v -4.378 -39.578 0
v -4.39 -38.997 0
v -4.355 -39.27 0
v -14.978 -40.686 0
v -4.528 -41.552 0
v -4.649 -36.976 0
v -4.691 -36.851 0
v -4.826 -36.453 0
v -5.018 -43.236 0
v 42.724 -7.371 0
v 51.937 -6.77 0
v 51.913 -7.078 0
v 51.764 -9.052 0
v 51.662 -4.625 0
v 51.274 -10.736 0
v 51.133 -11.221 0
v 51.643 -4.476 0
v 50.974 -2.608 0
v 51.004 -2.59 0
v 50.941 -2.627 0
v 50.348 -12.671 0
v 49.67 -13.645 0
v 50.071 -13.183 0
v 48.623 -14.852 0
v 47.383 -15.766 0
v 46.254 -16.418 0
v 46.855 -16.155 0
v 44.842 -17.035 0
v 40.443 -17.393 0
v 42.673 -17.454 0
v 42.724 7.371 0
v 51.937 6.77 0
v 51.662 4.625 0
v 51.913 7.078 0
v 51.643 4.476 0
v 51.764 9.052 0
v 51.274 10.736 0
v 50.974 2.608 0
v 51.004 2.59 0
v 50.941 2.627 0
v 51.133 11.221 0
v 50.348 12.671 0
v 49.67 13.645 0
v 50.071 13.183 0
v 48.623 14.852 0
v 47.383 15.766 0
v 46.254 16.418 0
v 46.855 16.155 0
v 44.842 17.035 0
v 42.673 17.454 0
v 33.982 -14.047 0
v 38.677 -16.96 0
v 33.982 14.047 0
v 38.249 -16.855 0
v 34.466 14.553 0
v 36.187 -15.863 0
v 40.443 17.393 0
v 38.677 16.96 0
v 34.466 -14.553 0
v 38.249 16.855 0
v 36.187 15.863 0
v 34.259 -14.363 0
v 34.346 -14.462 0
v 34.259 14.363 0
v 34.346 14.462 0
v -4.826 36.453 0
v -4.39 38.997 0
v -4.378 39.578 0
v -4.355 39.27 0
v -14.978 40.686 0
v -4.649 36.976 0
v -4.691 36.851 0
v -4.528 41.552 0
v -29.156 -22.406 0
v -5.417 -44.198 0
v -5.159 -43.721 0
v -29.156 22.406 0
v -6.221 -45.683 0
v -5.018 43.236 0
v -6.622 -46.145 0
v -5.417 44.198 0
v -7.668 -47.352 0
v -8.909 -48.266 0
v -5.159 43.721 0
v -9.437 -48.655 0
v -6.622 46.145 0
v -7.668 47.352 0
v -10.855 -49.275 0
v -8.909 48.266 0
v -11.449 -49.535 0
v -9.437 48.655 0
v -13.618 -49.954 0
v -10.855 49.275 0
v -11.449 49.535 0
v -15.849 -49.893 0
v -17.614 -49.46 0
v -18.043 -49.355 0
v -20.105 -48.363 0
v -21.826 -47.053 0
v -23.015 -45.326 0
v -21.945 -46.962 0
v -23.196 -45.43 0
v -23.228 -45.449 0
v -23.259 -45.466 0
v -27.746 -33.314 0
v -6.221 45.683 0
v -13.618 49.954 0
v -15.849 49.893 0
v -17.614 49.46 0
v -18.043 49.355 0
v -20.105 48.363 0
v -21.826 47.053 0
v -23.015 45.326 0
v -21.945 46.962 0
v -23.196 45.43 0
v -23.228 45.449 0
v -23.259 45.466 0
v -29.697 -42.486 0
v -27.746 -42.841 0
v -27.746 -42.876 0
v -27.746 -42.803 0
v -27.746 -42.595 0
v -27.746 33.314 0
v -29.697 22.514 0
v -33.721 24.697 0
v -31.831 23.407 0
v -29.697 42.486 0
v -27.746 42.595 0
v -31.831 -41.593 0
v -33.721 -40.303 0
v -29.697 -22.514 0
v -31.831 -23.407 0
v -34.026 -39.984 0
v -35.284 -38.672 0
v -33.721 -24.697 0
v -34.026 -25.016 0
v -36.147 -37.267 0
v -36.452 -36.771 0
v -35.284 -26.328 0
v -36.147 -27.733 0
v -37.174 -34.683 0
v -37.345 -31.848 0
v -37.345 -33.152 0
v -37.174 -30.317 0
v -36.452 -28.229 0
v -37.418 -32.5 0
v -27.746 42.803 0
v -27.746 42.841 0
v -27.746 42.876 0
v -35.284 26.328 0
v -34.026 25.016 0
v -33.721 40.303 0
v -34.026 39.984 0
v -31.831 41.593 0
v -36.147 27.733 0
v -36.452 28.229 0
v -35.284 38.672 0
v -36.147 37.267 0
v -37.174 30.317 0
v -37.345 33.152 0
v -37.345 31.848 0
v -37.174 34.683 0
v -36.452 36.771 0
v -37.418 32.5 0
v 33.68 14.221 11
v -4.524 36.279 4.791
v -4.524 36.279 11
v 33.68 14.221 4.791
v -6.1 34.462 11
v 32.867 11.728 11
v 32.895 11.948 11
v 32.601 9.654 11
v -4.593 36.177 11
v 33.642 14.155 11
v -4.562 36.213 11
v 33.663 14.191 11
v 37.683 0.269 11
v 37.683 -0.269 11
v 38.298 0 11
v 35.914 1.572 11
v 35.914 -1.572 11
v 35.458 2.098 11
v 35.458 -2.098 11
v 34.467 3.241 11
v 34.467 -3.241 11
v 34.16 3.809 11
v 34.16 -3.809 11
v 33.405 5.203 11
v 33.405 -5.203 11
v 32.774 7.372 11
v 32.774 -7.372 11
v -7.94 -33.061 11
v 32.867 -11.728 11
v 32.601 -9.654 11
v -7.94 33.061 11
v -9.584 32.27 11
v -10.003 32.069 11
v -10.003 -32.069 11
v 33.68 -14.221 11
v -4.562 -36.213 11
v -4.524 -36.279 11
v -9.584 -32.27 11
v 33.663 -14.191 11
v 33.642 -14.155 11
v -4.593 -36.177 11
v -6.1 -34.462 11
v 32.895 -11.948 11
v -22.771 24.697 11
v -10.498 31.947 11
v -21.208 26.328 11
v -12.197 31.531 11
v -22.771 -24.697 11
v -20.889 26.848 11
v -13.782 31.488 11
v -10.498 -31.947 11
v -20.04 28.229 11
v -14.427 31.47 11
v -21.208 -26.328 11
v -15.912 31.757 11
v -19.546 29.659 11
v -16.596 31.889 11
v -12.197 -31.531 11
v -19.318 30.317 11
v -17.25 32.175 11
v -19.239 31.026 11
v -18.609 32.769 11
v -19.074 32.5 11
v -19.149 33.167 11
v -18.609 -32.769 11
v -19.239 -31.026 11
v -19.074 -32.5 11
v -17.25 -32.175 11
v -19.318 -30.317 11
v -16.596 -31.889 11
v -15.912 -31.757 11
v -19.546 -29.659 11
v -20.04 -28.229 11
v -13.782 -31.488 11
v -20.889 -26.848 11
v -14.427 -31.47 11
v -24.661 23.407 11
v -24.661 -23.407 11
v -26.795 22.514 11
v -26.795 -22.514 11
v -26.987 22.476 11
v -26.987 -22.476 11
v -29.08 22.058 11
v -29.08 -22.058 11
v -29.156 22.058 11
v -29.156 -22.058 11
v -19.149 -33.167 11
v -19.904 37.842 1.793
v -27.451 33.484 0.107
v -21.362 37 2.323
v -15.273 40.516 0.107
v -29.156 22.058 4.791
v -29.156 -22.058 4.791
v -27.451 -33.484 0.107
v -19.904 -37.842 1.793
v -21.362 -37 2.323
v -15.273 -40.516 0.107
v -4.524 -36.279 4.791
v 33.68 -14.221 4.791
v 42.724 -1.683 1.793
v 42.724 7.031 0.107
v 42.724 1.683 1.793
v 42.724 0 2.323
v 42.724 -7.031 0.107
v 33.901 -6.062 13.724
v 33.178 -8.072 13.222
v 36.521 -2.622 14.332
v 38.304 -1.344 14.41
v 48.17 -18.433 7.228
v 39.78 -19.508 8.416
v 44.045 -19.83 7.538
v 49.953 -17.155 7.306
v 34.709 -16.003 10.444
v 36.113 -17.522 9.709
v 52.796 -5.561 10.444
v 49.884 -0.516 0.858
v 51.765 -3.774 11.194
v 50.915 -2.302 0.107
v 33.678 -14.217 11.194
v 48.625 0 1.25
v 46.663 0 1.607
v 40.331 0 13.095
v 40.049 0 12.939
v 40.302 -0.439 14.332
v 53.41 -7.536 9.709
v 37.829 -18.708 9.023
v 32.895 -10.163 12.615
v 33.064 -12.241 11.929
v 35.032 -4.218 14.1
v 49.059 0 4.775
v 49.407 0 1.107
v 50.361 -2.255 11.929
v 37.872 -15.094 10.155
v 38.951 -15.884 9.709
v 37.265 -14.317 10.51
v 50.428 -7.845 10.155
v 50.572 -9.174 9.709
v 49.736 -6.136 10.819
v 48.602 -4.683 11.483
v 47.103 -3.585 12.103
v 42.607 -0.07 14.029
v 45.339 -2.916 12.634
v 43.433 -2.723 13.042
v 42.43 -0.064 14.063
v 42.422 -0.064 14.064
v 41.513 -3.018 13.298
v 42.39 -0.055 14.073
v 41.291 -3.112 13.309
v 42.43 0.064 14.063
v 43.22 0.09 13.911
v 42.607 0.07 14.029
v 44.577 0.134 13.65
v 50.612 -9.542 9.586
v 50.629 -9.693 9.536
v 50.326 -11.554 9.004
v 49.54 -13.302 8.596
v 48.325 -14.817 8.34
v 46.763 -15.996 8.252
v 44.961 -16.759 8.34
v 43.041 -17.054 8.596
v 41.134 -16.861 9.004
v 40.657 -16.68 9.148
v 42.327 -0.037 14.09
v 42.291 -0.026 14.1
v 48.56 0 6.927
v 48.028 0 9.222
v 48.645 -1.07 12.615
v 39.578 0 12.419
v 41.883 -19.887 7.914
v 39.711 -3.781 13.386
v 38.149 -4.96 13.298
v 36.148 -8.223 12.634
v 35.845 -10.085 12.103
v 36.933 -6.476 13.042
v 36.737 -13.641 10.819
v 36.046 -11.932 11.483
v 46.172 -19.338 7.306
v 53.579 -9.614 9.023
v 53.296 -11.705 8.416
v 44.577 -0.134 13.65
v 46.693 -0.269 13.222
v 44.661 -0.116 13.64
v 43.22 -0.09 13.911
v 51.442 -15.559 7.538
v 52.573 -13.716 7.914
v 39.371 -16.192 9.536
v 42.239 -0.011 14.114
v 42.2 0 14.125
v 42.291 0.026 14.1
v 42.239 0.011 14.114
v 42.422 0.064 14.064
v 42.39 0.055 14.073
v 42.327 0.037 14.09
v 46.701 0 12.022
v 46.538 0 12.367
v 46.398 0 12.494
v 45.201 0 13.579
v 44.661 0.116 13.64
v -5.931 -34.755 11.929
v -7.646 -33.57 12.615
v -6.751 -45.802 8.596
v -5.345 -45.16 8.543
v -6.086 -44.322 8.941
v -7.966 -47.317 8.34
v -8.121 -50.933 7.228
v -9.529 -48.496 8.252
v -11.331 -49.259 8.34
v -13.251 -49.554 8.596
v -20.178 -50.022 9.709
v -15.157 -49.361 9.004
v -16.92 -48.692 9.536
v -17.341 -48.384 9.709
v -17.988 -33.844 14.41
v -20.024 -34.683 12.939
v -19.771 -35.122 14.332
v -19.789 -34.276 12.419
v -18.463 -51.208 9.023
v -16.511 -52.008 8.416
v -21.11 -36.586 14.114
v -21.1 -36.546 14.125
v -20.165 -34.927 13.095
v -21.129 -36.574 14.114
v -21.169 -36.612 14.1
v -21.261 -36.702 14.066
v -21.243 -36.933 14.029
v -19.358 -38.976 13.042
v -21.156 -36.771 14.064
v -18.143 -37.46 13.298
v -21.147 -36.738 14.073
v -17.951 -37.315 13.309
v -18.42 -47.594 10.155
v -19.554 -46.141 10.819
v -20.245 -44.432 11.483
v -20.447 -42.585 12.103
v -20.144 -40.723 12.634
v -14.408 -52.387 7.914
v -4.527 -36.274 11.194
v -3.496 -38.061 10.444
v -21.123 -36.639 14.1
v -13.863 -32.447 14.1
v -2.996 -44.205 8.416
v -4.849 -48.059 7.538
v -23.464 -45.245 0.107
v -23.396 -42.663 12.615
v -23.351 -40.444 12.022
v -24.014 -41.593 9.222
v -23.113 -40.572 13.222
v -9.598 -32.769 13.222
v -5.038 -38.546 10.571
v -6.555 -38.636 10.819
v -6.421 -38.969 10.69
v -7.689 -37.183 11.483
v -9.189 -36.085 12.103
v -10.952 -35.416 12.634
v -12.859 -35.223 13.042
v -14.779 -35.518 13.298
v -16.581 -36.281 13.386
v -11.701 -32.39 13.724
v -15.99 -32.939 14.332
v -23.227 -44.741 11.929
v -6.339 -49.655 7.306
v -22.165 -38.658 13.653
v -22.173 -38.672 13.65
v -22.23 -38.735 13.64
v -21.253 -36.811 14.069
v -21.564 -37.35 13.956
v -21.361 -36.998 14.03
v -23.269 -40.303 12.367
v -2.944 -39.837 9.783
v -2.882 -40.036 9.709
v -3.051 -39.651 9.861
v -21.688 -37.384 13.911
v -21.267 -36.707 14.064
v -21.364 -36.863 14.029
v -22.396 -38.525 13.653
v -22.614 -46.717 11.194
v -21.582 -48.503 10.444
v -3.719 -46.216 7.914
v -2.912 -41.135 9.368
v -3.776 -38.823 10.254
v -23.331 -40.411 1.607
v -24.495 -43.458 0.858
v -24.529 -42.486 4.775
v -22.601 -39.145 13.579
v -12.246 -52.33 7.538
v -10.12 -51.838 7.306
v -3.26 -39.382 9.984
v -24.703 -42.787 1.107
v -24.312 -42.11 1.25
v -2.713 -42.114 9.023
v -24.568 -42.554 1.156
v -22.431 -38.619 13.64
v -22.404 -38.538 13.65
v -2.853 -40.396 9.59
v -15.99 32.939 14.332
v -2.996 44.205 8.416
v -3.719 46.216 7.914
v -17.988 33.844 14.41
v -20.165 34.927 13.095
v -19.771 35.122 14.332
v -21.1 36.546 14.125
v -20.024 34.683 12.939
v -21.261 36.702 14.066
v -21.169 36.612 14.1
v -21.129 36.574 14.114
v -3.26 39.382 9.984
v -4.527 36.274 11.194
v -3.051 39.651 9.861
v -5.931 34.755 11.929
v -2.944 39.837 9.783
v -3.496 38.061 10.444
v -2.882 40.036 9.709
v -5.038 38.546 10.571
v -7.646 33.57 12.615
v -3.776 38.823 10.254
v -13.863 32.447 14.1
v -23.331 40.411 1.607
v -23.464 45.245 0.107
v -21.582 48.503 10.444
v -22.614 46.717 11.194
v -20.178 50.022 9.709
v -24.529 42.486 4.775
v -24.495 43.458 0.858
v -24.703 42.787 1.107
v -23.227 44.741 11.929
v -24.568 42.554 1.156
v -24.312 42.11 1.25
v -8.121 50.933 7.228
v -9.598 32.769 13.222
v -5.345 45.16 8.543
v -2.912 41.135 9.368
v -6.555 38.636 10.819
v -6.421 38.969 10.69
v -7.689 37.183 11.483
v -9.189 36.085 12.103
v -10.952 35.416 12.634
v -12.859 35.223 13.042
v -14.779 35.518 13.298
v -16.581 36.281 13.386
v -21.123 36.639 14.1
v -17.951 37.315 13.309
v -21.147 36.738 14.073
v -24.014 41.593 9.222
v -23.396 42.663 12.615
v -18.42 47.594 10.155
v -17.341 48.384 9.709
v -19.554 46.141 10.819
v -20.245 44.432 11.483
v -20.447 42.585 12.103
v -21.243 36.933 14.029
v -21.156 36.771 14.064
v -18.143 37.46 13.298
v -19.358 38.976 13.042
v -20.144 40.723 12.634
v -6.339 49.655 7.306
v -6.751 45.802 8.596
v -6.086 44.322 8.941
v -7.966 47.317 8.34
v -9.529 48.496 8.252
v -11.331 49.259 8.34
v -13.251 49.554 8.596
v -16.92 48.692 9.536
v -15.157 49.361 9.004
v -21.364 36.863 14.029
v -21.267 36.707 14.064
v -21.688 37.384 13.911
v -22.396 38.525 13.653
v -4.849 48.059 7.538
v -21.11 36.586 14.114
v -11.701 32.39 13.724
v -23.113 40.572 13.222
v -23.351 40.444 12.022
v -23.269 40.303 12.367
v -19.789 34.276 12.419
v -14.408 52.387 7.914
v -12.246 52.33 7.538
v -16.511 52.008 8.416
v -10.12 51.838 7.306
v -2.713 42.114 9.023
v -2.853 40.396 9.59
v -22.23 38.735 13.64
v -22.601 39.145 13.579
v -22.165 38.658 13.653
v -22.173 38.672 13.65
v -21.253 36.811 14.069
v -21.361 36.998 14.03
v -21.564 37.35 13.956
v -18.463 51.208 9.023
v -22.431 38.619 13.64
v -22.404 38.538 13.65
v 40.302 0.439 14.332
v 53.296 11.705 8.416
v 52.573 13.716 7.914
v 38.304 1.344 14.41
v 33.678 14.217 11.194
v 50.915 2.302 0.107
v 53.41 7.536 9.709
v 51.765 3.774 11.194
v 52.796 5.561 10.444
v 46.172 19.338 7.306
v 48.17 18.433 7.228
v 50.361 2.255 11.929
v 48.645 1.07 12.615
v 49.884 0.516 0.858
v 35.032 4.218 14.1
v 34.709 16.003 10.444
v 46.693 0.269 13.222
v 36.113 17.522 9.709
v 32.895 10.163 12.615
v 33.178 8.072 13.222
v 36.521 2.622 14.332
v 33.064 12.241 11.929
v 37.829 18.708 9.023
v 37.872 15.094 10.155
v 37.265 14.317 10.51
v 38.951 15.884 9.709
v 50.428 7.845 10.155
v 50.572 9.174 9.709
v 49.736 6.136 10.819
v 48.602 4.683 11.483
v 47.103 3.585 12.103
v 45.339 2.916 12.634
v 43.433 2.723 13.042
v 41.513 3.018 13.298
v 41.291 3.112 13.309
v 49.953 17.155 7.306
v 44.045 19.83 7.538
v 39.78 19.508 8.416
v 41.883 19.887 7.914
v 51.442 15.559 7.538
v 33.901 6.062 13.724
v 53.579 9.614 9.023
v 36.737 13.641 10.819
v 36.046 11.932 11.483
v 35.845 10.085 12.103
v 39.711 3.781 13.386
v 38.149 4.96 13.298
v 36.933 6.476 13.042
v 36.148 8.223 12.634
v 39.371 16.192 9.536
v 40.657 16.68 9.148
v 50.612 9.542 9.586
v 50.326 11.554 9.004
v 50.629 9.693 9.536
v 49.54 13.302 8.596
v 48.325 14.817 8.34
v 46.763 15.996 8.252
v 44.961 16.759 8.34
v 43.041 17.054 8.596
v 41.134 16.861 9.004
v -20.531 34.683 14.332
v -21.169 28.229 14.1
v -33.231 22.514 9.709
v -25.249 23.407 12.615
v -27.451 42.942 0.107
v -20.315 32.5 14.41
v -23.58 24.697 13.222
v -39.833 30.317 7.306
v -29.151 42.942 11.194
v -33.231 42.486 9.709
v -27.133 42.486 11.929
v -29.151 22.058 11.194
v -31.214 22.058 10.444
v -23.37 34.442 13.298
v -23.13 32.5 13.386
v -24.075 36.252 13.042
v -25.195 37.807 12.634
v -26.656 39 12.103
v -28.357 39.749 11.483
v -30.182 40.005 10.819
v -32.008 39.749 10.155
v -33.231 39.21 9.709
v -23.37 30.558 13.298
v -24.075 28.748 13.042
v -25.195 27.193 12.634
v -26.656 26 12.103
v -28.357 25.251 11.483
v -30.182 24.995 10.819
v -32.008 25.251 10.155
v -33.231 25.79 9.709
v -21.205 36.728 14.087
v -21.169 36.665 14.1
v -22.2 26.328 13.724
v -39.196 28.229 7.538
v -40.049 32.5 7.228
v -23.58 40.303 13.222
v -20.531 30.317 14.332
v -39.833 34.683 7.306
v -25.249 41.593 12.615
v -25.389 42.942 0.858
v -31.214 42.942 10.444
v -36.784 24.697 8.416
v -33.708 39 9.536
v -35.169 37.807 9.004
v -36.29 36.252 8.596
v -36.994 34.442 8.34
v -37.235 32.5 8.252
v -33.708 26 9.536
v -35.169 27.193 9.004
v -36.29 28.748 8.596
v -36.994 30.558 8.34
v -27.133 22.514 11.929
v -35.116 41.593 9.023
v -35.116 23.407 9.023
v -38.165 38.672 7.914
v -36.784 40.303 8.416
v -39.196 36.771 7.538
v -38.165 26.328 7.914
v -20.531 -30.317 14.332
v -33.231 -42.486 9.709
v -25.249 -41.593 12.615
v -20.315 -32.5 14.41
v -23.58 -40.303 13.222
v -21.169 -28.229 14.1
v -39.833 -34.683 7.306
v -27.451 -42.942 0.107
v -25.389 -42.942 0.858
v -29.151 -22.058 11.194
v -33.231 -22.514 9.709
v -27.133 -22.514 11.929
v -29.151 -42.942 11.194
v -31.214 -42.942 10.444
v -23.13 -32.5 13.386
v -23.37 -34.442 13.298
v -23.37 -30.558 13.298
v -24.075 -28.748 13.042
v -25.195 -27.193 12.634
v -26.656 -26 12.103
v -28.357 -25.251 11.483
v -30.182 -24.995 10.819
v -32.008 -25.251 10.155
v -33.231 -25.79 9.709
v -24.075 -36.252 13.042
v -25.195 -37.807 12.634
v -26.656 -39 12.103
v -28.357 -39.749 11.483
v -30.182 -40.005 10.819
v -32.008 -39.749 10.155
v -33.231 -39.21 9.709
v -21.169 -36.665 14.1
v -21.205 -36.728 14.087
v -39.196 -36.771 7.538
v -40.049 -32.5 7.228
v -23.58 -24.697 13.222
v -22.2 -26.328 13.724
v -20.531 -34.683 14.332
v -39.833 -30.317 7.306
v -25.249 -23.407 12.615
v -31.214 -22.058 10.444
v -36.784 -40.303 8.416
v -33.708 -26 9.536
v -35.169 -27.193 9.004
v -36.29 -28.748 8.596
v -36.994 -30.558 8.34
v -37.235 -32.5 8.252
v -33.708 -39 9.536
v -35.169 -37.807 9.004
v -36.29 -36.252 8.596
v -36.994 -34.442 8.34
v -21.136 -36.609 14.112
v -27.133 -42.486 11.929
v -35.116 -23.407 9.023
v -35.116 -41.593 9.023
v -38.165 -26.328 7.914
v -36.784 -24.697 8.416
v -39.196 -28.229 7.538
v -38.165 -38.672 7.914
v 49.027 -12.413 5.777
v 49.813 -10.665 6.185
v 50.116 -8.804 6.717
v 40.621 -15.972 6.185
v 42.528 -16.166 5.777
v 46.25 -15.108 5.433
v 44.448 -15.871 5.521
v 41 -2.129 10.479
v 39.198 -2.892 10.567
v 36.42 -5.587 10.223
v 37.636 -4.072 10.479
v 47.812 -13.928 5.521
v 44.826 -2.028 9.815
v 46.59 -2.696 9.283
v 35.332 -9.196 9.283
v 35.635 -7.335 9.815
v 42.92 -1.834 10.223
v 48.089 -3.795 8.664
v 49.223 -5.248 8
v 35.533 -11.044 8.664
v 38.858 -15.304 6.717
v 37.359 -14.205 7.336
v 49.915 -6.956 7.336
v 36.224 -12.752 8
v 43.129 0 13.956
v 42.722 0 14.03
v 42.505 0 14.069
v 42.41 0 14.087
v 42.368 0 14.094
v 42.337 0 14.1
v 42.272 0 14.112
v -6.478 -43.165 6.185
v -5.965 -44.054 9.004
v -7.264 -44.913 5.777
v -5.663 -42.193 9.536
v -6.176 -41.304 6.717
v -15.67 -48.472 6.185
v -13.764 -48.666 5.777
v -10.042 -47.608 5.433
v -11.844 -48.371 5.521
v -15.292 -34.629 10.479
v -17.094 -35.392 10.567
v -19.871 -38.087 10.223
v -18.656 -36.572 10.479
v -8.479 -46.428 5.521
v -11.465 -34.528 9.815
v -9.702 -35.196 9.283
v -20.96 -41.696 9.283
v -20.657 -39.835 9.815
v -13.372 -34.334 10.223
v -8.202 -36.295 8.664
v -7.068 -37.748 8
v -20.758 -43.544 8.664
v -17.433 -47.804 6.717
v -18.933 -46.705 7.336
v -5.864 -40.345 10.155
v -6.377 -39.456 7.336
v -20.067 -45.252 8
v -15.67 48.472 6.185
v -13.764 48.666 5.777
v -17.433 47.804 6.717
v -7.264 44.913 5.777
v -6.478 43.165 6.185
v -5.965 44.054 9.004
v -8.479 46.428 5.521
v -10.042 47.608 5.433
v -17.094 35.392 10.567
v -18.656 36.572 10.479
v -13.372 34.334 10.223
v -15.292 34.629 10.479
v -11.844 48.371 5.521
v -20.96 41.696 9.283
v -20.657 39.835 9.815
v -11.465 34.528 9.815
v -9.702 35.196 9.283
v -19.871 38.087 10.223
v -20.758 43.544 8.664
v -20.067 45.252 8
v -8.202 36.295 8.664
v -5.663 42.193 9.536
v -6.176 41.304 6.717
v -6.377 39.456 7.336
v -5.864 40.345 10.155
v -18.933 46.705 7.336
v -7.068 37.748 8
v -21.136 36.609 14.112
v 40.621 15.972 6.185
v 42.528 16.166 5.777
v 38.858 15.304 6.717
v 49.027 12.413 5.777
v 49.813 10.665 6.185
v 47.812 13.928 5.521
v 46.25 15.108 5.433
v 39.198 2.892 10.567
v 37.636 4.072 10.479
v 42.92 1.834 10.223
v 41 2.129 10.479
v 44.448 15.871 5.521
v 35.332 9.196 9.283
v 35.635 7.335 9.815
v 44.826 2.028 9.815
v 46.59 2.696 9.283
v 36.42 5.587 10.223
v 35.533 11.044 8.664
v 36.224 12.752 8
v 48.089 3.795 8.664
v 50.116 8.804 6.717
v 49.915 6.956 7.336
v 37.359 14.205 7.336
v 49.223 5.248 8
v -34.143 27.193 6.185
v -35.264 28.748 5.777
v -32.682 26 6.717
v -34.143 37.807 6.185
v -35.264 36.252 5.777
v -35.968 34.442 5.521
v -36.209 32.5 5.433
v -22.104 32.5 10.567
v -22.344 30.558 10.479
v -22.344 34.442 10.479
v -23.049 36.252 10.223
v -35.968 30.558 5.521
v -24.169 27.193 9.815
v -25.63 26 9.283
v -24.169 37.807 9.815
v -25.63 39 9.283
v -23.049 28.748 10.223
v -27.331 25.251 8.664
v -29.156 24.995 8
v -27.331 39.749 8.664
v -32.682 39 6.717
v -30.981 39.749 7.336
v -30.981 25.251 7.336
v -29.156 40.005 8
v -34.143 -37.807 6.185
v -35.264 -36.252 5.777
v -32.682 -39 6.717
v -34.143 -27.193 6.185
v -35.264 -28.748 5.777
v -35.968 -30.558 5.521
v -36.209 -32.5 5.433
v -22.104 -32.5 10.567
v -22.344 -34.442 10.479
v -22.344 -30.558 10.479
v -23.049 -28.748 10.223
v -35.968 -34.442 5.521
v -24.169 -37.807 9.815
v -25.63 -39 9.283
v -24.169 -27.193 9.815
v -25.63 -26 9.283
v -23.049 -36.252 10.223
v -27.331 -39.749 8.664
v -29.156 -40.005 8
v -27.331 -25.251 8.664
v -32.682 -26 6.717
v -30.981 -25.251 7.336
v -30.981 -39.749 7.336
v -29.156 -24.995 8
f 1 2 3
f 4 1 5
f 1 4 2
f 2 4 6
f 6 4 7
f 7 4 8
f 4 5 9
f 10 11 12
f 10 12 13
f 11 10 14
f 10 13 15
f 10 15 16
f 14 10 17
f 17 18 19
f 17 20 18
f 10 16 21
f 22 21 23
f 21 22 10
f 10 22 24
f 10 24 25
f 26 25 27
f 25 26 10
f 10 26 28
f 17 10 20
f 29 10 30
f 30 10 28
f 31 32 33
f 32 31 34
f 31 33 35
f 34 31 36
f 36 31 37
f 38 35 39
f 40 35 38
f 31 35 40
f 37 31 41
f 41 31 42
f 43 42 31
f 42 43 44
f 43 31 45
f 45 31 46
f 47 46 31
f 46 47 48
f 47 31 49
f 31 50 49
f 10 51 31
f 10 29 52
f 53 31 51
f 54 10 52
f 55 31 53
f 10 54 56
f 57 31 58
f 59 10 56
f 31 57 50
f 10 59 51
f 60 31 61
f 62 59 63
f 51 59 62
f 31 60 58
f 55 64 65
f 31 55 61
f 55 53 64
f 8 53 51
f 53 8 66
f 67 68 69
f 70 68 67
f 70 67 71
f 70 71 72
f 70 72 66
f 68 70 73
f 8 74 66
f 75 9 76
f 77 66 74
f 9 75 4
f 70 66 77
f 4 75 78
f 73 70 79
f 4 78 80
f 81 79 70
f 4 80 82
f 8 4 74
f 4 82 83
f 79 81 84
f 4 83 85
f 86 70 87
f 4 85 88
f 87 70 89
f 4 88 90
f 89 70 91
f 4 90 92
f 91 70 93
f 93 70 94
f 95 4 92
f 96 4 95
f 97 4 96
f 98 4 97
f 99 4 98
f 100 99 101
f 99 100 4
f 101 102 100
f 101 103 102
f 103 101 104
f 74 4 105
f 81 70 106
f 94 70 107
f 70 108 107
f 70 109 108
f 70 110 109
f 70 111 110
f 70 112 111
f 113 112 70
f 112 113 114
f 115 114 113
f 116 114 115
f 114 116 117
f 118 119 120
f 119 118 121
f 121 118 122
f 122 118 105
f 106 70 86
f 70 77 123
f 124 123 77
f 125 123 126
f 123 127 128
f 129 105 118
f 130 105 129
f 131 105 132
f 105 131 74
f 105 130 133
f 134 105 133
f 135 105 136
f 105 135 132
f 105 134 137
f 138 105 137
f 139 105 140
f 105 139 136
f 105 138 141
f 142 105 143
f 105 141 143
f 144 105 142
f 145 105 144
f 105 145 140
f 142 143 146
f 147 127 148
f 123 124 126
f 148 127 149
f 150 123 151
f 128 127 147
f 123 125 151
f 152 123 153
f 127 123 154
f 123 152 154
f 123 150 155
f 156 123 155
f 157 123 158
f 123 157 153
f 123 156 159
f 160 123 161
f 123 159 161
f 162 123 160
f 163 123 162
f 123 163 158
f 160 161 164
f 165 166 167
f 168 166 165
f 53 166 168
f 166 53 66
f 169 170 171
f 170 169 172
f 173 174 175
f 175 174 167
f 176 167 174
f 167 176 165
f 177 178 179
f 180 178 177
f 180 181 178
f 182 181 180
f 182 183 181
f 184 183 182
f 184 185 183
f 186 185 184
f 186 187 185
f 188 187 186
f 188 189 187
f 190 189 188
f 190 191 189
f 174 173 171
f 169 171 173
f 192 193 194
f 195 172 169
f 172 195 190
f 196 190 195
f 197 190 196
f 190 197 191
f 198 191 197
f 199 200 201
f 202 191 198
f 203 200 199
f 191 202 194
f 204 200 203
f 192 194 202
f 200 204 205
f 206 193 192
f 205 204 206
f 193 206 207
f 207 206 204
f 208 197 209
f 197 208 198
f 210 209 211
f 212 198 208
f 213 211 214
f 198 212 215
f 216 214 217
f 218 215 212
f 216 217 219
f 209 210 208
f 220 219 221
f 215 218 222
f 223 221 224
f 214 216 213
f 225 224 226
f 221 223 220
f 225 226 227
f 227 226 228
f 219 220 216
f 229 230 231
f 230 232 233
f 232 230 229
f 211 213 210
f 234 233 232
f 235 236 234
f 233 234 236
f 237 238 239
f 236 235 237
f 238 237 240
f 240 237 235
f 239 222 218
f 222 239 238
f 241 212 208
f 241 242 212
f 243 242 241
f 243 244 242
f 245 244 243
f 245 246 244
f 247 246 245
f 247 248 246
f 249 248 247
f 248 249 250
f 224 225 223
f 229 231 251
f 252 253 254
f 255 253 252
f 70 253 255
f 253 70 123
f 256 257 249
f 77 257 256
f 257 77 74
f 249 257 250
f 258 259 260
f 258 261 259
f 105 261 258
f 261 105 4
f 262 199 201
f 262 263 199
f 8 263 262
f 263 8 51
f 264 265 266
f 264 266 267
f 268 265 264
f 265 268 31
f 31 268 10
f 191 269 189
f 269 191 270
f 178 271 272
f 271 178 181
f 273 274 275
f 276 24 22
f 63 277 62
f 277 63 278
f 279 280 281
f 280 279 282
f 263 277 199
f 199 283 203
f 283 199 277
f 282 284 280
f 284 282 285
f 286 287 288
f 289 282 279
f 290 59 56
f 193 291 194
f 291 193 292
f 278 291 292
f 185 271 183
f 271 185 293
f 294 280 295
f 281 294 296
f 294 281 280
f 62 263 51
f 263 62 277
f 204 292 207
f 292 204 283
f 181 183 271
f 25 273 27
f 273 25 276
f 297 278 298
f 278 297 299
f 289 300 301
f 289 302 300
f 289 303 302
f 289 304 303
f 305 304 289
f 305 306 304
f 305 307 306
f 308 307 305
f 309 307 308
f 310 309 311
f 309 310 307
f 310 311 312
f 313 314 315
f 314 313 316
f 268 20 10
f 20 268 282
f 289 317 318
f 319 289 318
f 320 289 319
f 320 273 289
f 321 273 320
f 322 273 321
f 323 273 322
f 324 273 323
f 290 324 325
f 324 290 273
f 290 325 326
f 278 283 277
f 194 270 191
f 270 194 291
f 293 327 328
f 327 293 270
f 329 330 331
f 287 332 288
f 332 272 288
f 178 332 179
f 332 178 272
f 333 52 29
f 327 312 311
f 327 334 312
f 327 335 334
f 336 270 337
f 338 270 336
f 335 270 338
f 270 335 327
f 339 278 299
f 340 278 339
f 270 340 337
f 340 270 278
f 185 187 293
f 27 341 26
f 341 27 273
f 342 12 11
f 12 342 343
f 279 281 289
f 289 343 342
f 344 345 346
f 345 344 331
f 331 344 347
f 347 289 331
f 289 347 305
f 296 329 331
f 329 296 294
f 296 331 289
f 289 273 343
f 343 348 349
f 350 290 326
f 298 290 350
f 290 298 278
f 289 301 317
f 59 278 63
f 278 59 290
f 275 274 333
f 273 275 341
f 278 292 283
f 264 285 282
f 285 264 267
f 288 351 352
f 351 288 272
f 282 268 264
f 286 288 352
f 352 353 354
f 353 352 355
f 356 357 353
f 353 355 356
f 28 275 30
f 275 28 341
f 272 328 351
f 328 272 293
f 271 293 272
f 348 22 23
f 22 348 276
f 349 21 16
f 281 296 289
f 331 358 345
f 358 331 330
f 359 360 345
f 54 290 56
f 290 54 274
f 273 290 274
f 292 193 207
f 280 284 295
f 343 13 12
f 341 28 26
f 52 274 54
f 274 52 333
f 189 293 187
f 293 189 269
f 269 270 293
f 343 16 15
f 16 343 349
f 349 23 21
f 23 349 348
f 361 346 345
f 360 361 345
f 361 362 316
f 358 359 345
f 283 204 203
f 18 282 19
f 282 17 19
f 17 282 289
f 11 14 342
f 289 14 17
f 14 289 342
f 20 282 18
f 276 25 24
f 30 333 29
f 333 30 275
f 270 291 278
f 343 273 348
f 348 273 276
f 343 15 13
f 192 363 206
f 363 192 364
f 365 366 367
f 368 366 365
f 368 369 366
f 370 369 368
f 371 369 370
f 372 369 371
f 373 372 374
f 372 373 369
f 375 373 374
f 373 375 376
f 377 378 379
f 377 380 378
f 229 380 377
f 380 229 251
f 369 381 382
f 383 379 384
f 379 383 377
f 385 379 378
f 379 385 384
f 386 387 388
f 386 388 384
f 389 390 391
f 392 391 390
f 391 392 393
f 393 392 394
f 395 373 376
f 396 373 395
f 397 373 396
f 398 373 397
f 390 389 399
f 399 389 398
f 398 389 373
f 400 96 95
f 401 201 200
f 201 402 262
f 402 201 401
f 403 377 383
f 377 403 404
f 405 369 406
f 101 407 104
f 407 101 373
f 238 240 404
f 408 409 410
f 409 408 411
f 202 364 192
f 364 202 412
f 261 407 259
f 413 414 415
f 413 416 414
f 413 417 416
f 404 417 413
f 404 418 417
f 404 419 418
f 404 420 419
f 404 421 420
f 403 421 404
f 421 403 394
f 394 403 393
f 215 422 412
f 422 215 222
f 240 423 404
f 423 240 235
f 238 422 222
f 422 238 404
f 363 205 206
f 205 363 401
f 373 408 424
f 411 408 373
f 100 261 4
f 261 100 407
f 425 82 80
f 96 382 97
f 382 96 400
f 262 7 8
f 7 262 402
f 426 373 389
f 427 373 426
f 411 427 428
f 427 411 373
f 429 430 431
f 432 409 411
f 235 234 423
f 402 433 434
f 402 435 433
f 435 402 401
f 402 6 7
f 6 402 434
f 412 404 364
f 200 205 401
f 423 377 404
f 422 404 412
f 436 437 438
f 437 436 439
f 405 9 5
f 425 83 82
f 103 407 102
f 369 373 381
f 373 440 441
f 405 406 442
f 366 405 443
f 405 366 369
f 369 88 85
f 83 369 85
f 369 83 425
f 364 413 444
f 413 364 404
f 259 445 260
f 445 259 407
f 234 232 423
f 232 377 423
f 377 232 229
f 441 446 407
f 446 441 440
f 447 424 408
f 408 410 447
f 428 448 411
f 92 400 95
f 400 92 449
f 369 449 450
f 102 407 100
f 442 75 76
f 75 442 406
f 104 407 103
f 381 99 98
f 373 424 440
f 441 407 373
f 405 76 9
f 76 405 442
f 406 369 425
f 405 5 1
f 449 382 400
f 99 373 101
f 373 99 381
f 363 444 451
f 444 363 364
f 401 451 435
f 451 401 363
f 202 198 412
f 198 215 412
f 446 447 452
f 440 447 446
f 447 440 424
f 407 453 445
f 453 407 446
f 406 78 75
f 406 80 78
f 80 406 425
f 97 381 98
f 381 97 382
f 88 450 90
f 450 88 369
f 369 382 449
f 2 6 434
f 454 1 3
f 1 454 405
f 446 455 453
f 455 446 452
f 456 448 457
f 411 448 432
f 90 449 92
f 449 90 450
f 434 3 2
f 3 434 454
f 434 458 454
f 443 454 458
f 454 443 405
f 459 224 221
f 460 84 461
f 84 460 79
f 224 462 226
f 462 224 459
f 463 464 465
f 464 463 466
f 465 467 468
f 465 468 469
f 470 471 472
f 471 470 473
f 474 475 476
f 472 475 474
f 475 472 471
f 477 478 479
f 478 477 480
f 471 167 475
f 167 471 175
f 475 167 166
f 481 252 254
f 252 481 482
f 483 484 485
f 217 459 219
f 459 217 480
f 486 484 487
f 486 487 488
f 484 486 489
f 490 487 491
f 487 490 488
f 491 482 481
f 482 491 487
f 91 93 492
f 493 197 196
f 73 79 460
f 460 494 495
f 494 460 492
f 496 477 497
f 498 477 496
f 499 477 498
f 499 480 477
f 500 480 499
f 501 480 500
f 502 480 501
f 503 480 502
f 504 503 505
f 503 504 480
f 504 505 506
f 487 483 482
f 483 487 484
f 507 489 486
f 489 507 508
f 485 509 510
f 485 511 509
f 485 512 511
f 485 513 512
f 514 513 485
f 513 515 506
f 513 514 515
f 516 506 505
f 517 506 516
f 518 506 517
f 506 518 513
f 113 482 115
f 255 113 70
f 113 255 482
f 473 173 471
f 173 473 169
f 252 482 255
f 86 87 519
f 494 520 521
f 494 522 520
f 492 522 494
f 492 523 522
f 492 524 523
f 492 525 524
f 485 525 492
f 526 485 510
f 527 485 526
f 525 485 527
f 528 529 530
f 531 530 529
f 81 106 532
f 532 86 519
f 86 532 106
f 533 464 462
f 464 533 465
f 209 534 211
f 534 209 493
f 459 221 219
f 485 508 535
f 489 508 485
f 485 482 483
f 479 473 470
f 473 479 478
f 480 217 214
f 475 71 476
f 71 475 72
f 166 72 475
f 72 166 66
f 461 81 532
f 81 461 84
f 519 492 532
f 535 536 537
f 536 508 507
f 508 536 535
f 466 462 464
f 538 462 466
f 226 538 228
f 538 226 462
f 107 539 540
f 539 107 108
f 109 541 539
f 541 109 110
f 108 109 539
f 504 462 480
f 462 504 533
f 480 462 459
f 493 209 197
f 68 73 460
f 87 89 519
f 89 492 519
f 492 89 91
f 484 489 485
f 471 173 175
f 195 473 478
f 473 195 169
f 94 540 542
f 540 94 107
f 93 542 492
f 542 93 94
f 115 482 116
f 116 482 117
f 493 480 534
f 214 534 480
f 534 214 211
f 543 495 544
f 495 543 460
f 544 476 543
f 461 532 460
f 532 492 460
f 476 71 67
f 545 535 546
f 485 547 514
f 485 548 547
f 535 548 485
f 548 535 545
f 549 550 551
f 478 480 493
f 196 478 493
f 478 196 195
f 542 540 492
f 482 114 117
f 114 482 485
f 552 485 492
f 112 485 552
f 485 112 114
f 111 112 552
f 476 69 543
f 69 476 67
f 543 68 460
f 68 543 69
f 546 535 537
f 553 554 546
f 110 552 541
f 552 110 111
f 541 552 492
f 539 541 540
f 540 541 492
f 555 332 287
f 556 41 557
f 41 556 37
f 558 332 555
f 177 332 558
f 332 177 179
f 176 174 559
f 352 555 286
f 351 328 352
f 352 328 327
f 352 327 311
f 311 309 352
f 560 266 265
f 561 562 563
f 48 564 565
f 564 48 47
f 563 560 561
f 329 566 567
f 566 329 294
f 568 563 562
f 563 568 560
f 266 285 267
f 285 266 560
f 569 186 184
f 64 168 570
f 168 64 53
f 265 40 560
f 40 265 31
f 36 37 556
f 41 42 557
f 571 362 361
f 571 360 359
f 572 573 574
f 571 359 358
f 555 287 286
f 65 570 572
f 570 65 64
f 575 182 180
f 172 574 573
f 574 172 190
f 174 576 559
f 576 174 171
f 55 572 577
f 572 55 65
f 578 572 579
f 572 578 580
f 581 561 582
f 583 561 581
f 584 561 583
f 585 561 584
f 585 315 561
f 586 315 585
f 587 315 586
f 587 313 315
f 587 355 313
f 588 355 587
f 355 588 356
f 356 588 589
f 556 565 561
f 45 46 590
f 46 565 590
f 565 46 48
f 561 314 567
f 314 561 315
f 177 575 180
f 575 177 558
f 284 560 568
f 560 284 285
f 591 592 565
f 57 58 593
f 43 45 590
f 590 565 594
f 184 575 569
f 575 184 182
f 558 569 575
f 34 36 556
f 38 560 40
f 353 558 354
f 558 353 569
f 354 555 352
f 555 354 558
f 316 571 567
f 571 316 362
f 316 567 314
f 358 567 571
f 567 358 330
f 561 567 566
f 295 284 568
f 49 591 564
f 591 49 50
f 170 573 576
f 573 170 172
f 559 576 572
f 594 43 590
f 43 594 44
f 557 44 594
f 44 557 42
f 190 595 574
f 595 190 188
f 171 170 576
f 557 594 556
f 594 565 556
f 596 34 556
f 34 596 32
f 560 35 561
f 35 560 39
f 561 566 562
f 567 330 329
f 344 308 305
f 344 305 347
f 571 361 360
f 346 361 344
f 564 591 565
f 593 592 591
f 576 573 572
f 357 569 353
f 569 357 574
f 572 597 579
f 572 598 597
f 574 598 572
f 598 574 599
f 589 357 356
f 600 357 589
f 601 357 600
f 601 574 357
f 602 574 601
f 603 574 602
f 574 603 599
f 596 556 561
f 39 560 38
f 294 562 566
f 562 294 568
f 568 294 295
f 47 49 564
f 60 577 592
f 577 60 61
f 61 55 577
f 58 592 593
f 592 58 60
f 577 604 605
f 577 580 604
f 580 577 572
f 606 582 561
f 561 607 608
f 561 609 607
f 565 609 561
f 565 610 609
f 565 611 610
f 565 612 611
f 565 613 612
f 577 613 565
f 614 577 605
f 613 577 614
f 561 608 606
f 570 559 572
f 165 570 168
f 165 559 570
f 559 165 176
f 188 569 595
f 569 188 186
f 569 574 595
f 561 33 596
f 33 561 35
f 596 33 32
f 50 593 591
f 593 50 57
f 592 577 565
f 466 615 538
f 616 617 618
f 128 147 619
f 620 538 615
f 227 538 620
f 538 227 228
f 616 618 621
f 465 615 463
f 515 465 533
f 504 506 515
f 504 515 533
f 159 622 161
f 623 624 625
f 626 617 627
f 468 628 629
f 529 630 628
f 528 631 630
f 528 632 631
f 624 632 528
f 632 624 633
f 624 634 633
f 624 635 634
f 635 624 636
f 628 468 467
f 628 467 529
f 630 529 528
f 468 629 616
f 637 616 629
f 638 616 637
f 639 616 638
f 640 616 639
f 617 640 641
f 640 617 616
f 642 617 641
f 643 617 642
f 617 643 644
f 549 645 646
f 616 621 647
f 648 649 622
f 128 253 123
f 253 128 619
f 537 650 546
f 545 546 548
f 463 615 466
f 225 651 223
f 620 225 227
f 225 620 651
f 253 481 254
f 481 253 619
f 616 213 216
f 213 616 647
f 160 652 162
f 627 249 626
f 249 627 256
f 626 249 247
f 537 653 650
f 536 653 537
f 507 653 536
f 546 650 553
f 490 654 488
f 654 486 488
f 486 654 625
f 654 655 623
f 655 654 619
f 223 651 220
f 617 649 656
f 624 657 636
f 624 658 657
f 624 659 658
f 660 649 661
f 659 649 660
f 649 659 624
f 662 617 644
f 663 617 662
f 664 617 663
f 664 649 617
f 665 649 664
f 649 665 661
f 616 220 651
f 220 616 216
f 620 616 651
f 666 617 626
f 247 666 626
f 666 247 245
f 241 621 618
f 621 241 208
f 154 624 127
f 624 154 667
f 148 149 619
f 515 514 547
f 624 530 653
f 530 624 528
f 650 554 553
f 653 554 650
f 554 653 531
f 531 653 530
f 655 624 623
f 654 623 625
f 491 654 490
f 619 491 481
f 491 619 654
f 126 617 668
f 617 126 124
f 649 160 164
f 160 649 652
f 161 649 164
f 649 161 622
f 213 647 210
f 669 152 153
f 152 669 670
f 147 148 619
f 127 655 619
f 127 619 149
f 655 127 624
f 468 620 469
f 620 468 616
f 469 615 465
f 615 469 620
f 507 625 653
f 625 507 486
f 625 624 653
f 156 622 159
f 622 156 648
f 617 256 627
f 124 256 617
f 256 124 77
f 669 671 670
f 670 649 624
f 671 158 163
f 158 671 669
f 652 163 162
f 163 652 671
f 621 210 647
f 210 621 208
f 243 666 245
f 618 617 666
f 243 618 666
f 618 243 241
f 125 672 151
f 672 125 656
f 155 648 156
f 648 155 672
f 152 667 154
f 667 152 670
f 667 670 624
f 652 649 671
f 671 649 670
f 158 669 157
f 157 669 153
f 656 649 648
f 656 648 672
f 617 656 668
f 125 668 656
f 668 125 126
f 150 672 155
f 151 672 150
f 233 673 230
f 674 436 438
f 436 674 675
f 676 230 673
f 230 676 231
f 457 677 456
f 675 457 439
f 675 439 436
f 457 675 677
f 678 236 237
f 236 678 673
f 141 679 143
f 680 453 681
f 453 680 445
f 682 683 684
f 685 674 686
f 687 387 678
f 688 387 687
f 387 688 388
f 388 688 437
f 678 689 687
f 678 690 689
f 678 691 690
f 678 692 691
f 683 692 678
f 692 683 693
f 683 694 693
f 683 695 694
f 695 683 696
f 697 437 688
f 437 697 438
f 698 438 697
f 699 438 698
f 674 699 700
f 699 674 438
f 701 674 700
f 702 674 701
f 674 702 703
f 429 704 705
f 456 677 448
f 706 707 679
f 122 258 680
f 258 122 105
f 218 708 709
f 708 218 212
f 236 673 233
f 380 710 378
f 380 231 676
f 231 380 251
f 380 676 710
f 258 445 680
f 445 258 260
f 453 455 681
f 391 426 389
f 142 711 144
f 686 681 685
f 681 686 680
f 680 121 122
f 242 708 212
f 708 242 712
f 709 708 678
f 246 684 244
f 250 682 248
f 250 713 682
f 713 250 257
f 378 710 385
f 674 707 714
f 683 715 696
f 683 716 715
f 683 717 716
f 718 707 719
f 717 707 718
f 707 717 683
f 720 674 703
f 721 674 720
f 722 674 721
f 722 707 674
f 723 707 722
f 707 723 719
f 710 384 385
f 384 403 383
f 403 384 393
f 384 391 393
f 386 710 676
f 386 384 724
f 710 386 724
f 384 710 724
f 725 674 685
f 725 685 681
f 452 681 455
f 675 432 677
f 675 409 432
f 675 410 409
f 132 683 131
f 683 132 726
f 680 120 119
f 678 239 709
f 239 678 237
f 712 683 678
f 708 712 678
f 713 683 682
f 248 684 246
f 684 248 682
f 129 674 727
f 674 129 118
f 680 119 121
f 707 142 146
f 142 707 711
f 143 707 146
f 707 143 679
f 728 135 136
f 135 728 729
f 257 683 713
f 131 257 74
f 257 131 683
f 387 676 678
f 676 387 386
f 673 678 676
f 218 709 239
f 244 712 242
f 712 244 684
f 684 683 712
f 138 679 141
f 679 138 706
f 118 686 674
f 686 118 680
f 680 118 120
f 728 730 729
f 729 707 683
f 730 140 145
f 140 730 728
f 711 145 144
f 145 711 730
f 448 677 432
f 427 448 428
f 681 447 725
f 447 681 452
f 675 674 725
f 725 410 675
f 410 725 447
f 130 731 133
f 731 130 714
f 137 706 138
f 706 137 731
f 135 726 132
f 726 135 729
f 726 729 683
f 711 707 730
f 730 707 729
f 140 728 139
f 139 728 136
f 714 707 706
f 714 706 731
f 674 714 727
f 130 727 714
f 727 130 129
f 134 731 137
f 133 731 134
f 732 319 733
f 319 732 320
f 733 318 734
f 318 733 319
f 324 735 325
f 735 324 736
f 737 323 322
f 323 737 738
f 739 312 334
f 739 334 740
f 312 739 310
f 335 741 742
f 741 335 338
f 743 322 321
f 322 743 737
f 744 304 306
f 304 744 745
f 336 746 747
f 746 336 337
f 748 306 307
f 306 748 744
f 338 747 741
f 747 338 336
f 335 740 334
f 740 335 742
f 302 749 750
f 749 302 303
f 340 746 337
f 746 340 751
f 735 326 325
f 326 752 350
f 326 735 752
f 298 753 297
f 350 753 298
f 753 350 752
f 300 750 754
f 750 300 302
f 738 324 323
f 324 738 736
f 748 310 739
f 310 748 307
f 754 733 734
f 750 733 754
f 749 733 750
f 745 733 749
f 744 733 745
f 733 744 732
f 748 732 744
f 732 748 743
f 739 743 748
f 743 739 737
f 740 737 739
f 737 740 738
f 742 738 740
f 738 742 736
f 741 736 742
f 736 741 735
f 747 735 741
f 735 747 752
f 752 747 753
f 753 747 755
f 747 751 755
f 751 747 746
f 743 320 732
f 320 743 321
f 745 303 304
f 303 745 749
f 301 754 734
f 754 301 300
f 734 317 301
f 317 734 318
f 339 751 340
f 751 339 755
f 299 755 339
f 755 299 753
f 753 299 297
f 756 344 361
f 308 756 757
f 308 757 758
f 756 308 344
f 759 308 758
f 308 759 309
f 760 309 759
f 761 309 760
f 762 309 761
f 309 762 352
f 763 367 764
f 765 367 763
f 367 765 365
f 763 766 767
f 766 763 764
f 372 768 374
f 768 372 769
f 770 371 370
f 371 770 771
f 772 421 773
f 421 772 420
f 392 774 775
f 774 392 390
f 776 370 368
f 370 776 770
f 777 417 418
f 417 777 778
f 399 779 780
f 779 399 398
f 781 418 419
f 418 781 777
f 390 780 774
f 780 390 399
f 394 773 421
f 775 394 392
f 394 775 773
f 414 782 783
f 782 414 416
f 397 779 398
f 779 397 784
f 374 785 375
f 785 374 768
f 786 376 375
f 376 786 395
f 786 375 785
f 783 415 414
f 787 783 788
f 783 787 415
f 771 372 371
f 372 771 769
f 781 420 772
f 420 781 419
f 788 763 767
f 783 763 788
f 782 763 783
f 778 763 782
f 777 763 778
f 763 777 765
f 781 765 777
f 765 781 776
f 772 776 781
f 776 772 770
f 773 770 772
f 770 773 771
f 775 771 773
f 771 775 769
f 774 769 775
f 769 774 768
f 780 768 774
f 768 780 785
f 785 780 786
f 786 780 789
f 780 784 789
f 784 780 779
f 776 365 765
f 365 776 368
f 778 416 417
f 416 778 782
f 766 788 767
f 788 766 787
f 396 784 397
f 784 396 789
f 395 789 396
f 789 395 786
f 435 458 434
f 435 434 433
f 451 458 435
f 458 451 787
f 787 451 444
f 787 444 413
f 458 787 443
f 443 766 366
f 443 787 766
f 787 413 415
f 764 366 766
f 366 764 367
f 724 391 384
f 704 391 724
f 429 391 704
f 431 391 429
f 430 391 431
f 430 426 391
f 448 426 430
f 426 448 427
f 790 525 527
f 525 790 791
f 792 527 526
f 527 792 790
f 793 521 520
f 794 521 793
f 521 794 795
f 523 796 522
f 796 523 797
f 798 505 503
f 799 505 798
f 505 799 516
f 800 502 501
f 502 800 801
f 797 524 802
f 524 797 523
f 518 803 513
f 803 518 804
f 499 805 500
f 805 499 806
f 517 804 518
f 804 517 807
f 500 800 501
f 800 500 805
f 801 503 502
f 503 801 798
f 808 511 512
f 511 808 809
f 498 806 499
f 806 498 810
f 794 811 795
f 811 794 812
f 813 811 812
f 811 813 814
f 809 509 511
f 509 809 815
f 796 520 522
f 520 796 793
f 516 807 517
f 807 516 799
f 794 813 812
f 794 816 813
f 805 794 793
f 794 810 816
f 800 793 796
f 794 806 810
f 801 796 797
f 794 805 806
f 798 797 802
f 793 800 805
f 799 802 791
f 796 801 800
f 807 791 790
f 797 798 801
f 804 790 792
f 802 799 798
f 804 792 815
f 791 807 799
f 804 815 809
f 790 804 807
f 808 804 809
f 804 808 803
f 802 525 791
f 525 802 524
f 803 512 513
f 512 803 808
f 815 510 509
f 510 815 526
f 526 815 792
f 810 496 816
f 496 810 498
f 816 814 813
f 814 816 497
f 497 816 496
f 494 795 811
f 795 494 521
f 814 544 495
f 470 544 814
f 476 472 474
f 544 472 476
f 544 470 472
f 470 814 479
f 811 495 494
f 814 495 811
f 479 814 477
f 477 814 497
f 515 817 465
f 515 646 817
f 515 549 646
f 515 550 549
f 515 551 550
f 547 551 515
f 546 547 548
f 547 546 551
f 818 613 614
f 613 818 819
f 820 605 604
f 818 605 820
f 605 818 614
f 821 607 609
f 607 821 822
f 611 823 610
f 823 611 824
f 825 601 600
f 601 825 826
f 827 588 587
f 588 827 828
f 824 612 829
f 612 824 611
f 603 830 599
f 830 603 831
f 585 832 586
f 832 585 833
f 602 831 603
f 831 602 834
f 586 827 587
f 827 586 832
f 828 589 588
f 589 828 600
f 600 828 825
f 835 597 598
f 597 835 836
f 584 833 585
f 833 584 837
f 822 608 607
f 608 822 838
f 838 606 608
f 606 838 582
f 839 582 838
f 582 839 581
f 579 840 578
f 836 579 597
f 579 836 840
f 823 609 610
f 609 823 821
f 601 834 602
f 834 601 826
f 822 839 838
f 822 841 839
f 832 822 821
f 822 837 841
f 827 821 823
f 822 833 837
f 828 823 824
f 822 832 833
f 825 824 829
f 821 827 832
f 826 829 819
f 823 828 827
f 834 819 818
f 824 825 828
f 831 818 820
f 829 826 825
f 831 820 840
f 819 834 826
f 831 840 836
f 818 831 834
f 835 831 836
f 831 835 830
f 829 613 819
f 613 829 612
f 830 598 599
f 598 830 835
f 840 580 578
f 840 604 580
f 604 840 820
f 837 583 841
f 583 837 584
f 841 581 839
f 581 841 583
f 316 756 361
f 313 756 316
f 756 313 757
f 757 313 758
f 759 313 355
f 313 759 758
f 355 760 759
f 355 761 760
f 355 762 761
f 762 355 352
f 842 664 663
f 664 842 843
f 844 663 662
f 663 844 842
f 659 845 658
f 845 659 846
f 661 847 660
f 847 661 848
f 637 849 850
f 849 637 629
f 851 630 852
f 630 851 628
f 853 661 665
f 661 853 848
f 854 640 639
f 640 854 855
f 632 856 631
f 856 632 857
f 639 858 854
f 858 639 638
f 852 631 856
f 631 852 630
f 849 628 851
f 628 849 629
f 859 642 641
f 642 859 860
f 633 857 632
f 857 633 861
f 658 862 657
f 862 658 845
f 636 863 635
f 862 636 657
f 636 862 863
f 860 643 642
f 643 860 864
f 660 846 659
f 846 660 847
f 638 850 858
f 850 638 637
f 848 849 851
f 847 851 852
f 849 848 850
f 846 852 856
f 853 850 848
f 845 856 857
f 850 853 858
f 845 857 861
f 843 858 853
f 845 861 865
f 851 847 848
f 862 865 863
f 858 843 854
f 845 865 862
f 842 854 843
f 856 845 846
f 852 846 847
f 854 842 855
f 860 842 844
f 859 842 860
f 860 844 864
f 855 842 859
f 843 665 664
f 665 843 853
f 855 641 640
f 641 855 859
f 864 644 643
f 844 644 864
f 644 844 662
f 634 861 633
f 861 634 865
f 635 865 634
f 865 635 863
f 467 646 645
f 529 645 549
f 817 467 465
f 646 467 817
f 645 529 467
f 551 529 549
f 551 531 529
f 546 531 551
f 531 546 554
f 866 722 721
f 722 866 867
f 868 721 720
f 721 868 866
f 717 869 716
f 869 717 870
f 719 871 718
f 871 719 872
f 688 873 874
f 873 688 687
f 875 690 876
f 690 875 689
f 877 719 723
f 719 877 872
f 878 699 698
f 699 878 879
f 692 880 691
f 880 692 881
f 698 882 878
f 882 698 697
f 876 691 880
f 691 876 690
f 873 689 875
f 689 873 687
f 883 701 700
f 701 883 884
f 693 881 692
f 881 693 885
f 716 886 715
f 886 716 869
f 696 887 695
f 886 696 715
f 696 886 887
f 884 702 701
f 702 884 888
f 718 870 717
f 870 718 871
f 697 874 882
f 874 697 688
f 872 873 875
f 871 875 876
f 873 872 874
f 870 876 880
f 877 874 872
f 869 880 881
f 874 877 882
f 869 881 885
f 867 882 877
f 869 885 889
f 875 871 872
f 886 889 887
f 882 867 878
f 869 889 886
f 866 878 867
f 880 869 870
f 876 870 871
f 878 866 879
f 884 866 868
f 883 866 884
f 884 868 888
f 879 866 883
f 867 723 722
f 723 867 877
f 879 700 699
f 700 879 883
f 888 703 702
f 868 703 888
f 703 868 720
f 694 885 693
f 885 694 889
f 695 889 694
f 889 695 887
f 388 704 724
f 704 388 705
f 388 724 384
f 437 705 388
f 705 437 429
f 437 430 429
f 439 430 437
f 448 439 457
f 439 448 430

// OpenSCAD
// file: ../../conf/printer_config.scad
/**********************************************************************************************************************
 **
 ** conf/printer_config.scad
 **
 ** This file contains the main control variables that determine the size and shape of the printer. Note that in the
 ** actual parts specifications, the constants defined here will only ever be accessed through functions defined in
 ** conf/derived_sizes.scad exclusively to allow for easier adaptation, should the mode of calculation change. 
 **
 ** All sizes in mm. Caution: Little to no cross-checking is implemented. Change values sensibly and one at a time.
 **
 ** This file is NOT to be included by any other file except for conf/derived_sizes.scad.
 **
 **********************************************************************************************************************/

// ===== PRINTER CONFIGURATION ========================================================================================

// The length of the vertical MakerSlide extrusions that make up the rails for the carriages.
FRAME_V_RAIL_HEIGHT = 800;

// The length of the horizontal 20x20 V-Slot extrusions that form the sides of the triangle.
FRAME_H_RAIL_LENGTH = 400;

// ===== FABRICATED PART DIMENSIONS ===================================================================================

// The additional clearance to leave around the MakerSlide extrusion.
MAKERSLIDE_CLEARANCE = 0.05;

// The thickness of the walls outside the extruded parts.
FRAME_PART_WALL_THICKNESS = 3;

// The thickness of the wall that separates the vertical rails from the horizontal extrusions.
FRAME_V_H_RAIL_SEPARATION = 8;

// The depth of the holes that hold the V-Slot extrusions.
FRAME_PART_VSLOT_DEPTH = 30;

// The depth of the holes in the foot that hold the MakerSlide extrusions.
FRAME_FOOT_MAKERSLIDE_DEPTH = 25; 

// The height of the bracket that holds the motor. WARNING: Increasing this might make it difficult to 
// turn the screws that hold the motor.
FRAME_MOTOR_BRACKET_HEIGHT = 25;

// The height of the bracket that holds the intermediate level with the working surface (print bed).
FRAME_BED_BRACKET_HEIGHT = 25; 

// The depth of the holes in the head that hold the MakerSlide extrusions.
FRAME_HEAD_MAKERSLIDE_DEPTH = 35; 

// The thickness of the carriage base plate. A thicker plate will make the carriage stiffer, but cost more
// material to print and take away space from the working area.
CARRIAGE_PLATE_THICKNESS = 6;

// The width of the border around the holes in the carriage base plate that hold the V-Wheels. 
CARRIAGE_PLATE_BORDER_WIDTH = 8;

// The range by which the vertical belt tensioner can be adjusted.
TENSIONER_RANGE = 15;

// The distance between the rods that hold the effector.
ROD_DISTANCE = 65;

// The downward angle of the magnets in the carriage.
CARRIAGE_MAGNET_ANGLE = 45;

// The outer diameter of the magnets in the carriage.
CARRIAGE_MAGNET_DIAMETER = 10;

// The depth of the magnets in the carriage.
CARRIAGE_MAGNET_DEPTH = 5;

// The thickness of the walls around the magnets.
CARRIAGE_MAGNET_WALL_THICKNESS = 4;

// The outward angle of the magnets in the effector.
EFFECTOR_MAGNET_ANGLE = 20;

// The outer diameter of the magnets in the effector.
EFFECTOR_MAGNET_DIAMETER = 15;

// The depth of the magnets in the effector.
EFFECTOR_MAGNET_DEPTH = 3;

// The thickness of the walls around the magnet.
EFFECTOR_MAGNET_WALL_THICKNESS = 3;

// The additional distance between the magnets on the effector (not the rod distance - the other one :-)).
// This value is added to the minimum distance determined by the magnet size and wall thickness.
EFFECTOR_MAGNET_ADDITIONAL_DISTANCE = 0;

// The minimal thickness of the effector plate. Note that if the magnet angle requires a thicker plate, the dimension
// will automatically be increased.
EFFECTOR_MIN_THICKNESS = 8;
// file: ../../bom/bom.scad
/**********************************************************************************************************************
 **
 ** bom/bom.scad
 **
 ** This file provides the functions to generate a basic bill of materials (BOM) from the model.
 **
 **********************************************************************************************************************/

/**
 * A recursive function to format the parent module hierarchy as a series of delimited sub-strings.
 * Example: "vertical_axis_assembly>_vertical_axis_assembly>makerslide_vertical_rail"
 */
function _bom_parent_list(level, delimiter = ">") = 
	(level < $parent_modules - 1) ? str(_bom_parent_list(level = level + 1), delimiter, parent_module(level)) : "";

module bom_entry(section = "", description = "", size = "", number = 1) {
	// Only perform any actions if WRITE_BOM is set. This is done through the command line - see Makefile.
	if (WRITE_BOM) {
		echo(str("BOM;", section, ";", description, ";", size, ";", number, ";", _bom_parent_list(level = 2)));
	}
}
// file: ../../conf/colors.scad
/**********************************************************************************************************************
 **
 ** conf/colors.scad
 **
 ** This file defines some modules to use symbolic colors throughout the entire project.
 **
 **********************************************************************************************************************/

/**
 * The color of the aluminium extrusions.
 */
module color_extrusion() {
	color("LightGrey")
		children();
} 

/**
 * The color of the "outer" printed frame elements.
 */
module color_printed_outer_frame() {
	color("RoyalBlue")
		children();
} 

/**
 * The color of the "inner" printed frame elements.
 */
module color_printed_inner_frame() {
	color("DodgerBlue")
		children();
} 

/**
 * The color of the printed carriages.
 */
module color_printed_carriage() {
	color("DodgerBlue")
		children();
} 

/**
 * The color of the printed tensioners and end switch brackets.
 */
module color_printed_head_parts() {
	color("PowderBlue")
		children();
} 

/**
 * The color of the printed effectors.
 */
module color_printed_effector() {
	color("DodgerBlue")
		children();
} 

/**
 * The color of the stock hardware parts like nuts, bolts and screws.
 */
module color_hardware() {
	color("DarkSlateGray")
		children();
} 

/**
 * The color of the magnets and steel balls.
 */
module color_magnets_balls() {
	color("Silver")
		children();
} 

/**
 * The color of the gears and ball bearings.
 */
module color_gears() {
	color("Gray")
		children();
} 

/**
 * The color of the belts.
 */
module color_belt() {
	color("SaddleBrown")
		children();
} 

/**
 * The color of the stepper motors.
 */
module color_motor() {
	color("DimGray")
		children();
} 

/**
 * The color of the end switches.
 */
module color_switch() {
	color([0.15, 0.15, 0.15])
		children();
} 

/**
 * The color of the V-Wheels.
 */
module color_vwheels() {
	color([0.075, 0.075, 0.075])
		children();
} 

/**
 * The color of punches and other objects that are usually not intended to be rendered as such, but rather to be
 * used as subtractive objects.
 */
module color_punch() {
	color("Red")
		children();
} 
// main file
/**********************************************************************************************************************
 **
 ** parts/printed/effector_base.scad
 **
 ** This file constructs the effector base plate which serves as a starting point for the actual effetor models.
 ** This part is not supposed to be printed.
 **
 **********************************************************************************************************************/

include <../../conf/colors.scad>
include <../../conf/derived_sizes.scad>
include <../../conf/part_sizes.scad>

use <../../bom/bom.scad>
use <../../parts/vitamins/vitamins.scad>

/**
 * Creates a magnet holder. 
 */
module _effector_base_magnet_holder() {
	translate([-effector_base_magnet_holder_height() + effector_base_magnet_depth(), 0, 0])
		rotate([0, 90, 0])
			cylinder(d = effector_base_magnet_holder_diameter(), h = effector_base_magnet_holder_height());
}

/**
 * Creates a hole to hold a magnet and the clean surface abovr.
 */
module _effector_base_magnet_hole_and_surface() {
	// the magnet hole
	rotate([0, 90, 0])
		cylinder(d = effector_base_magnet_diameter() + epsilon(), h = effector_base_magnet_depth() + epsilon());
	// a cylinder to clean the surface area
	translate([effector_base_magnet_depth(), 0, 0])
		rotate([0, 90, 0])
			cylinder(d = effector_base_magnet_holder_diameter(), h = effector_base_magnet_holder_height());
}

/**
 * Creates the effector base assembly by rendering it from scratch. This module is not to be called externally, use 
 * effector_base() instead.
 */
module _render_effector_base() {

	_mp_a_left  = effector_base_magnet_position_a_left();
	_mp_a_right = effector_base_magnet_position_a_right();
	_mp_b_left  = effector_base_magnet_position_b_left();
	_mp_b_right = effector_base_magnet_position_b_right();
	_mp_c_left  = effector_base_magnet_position_c_left();
	_mp_c_right = effector_base_magnet_position_c_right();

	color_printed_effector()
		render() {		
			difference() {
				union() {
					// the base plate			
				    linear_extrude(height = effector_base_thickness())
		        		polygon(points = [
		        				[ _mp_a_left[0],  _mp_a_left[1]  ],
								[ _mp_a_right[0], _mp_a_right[1] ],
								[ _mp_c_right[0], _mp_c_right[1] ],
								[ _mp_c_left[0],  _mp_c_left[1]  ],
								[ _mp_b_left[0],  _mp_b_left[1]  ],
								[ _mp_b_right[0], _mp_b_right[1] ]
		        			]);
    
					// the magnet holders
					translate(_mp_a_left)
						rotate([0, -90 - effector_base_magnet_angle(), 120])
							_effector_base_magnet_holder();
					translate(_mp_a_right)
						rotate([0, -90 - effector_base_magnet_angle(), 120])
							_effector_base_magnet_holder();
					translate(_mp_b_left)
						rotate([0, -90 - effector_base_magnet_angle(), -120])
							_effector_base_magnet_holder();
					translate(_mp_b_right)
						rotate([0, -90 - effector_base_magnet_angle(), -120])
							_effector_base_magnet_holder();
					translate(_mp_c_left)
						rotate([0, -90 - effector_base_magnet_angle(), 0])
							_effector_base_magnet_holder();
					translate(_mp_c_right)
						rotate([0, -90 - effector_base_magnet_angle(), 0])
							_effector_base_magnet_holder();
				}
				
				// minus everything in negative X
				translate([-effector_base_triangle_edge_length(), -effector_base_triangle_edge_length(), -effector_base_thickness()])
					cube([2*effector_base_triangle_edge_length(), 2*effector_base_triangle_edge_length(), effector_base_thickness()]);

				// minus the holes for the magnets
				translate(_mp_a_left)
					rotate([0, -90 - effector_base_magnet_angle(), 120])
						_effector_base_magnet_hole_and_surface();
				translate(_mp_a_right)
					rotate([0, -90 - effector_base_magnet_angle(), 120])
						_effector_base_magnet_hole_and_surface();
				translate(_mp_b_left)
					rotate([0, -90 - effector_base_magnet_angle(), -120])
						_effector_base_magnet_hole_and_surface();
				translate(_mp_b_right)
					rotate([0, -90 - effector_base_magnet_angle(), -120])
						_effector_base_magnet_hole_and_surface();
				translate(_mp_c_left)
					rotate([0, -90 - effector_base_magnet_angle(), 0])
						_effector_base_magnet_hole_and_surface();
				translate(_mp_c_right)
					rotate([0, -90 - effector_base_magnet_angle(), 0])
						_effector_base_magnet_hole_and_surface();
			}
		} 
}

/**
 * Main module to use the pre-rendered effector base. The assembly is centered at the origin. Since this version is
 * not supposed to be printed, no BOM entry is generated.
 */
module effector_base() {
	color_printed_effector()
		import(file = "effector_base.stl");
}

/** 
 * Renders the hardware (nuts, bolts, screws) that are used to fixed the printed part to the surrounding parts.
 * This also includes the V-Wheels and their supporting material.
 */
module effector_base_hardware() {
	// the magnets inside the holders
	translate(effector_base_magnet_position_a_left())
		rotate([0, -90 - effector_base_magnet_angle(), 120])
			magnet_ring(diameter = effector_base_magnet_diameter(), thickness = effector_base_magnet_depth());
	translate(effector_base_magnet_position_a_right())
		rotate([0, -90 - effector_base_magnet_angle(), 120])
			magnet_ring(diameter = effector_base_magnet_diameter(), thickness = effector_base_magnet_depth());
	translate(effector_base_magnet_position_b_left())
		rotate([0, -90 - effector_base_magnet_angle(), -120])
			magnet_ring(diameter = effector_base_magnet_diameter(), thickness = effector_base_magnet_depth());
	translate(effector_base_magnet_position_b_right())
		rotate([0, -90 - effector_base_magnet_angle(), -120])
			magnet_ring(diameter = effector_base_magnet_diameter(), thickness = effector_base_magnet_depth());
	translate(effector_base_magnet_position_c_left())
		rotate([0, -90 - effector_base_magnet_angle(), 0])
			magnet_ring(diameter = effector_base_magnet_diameter(), thickness = effector_base_magnet_depth());
	translate(effector_base_magnet_position_c_right())
		rotate([0, -90 - effector_base_magnet_angle(), 0])
			magnet_ring(diameter = effector_base_magnet_diameter(), thickness = effector_base_magnet_depth());
}

_render_effector_base();
